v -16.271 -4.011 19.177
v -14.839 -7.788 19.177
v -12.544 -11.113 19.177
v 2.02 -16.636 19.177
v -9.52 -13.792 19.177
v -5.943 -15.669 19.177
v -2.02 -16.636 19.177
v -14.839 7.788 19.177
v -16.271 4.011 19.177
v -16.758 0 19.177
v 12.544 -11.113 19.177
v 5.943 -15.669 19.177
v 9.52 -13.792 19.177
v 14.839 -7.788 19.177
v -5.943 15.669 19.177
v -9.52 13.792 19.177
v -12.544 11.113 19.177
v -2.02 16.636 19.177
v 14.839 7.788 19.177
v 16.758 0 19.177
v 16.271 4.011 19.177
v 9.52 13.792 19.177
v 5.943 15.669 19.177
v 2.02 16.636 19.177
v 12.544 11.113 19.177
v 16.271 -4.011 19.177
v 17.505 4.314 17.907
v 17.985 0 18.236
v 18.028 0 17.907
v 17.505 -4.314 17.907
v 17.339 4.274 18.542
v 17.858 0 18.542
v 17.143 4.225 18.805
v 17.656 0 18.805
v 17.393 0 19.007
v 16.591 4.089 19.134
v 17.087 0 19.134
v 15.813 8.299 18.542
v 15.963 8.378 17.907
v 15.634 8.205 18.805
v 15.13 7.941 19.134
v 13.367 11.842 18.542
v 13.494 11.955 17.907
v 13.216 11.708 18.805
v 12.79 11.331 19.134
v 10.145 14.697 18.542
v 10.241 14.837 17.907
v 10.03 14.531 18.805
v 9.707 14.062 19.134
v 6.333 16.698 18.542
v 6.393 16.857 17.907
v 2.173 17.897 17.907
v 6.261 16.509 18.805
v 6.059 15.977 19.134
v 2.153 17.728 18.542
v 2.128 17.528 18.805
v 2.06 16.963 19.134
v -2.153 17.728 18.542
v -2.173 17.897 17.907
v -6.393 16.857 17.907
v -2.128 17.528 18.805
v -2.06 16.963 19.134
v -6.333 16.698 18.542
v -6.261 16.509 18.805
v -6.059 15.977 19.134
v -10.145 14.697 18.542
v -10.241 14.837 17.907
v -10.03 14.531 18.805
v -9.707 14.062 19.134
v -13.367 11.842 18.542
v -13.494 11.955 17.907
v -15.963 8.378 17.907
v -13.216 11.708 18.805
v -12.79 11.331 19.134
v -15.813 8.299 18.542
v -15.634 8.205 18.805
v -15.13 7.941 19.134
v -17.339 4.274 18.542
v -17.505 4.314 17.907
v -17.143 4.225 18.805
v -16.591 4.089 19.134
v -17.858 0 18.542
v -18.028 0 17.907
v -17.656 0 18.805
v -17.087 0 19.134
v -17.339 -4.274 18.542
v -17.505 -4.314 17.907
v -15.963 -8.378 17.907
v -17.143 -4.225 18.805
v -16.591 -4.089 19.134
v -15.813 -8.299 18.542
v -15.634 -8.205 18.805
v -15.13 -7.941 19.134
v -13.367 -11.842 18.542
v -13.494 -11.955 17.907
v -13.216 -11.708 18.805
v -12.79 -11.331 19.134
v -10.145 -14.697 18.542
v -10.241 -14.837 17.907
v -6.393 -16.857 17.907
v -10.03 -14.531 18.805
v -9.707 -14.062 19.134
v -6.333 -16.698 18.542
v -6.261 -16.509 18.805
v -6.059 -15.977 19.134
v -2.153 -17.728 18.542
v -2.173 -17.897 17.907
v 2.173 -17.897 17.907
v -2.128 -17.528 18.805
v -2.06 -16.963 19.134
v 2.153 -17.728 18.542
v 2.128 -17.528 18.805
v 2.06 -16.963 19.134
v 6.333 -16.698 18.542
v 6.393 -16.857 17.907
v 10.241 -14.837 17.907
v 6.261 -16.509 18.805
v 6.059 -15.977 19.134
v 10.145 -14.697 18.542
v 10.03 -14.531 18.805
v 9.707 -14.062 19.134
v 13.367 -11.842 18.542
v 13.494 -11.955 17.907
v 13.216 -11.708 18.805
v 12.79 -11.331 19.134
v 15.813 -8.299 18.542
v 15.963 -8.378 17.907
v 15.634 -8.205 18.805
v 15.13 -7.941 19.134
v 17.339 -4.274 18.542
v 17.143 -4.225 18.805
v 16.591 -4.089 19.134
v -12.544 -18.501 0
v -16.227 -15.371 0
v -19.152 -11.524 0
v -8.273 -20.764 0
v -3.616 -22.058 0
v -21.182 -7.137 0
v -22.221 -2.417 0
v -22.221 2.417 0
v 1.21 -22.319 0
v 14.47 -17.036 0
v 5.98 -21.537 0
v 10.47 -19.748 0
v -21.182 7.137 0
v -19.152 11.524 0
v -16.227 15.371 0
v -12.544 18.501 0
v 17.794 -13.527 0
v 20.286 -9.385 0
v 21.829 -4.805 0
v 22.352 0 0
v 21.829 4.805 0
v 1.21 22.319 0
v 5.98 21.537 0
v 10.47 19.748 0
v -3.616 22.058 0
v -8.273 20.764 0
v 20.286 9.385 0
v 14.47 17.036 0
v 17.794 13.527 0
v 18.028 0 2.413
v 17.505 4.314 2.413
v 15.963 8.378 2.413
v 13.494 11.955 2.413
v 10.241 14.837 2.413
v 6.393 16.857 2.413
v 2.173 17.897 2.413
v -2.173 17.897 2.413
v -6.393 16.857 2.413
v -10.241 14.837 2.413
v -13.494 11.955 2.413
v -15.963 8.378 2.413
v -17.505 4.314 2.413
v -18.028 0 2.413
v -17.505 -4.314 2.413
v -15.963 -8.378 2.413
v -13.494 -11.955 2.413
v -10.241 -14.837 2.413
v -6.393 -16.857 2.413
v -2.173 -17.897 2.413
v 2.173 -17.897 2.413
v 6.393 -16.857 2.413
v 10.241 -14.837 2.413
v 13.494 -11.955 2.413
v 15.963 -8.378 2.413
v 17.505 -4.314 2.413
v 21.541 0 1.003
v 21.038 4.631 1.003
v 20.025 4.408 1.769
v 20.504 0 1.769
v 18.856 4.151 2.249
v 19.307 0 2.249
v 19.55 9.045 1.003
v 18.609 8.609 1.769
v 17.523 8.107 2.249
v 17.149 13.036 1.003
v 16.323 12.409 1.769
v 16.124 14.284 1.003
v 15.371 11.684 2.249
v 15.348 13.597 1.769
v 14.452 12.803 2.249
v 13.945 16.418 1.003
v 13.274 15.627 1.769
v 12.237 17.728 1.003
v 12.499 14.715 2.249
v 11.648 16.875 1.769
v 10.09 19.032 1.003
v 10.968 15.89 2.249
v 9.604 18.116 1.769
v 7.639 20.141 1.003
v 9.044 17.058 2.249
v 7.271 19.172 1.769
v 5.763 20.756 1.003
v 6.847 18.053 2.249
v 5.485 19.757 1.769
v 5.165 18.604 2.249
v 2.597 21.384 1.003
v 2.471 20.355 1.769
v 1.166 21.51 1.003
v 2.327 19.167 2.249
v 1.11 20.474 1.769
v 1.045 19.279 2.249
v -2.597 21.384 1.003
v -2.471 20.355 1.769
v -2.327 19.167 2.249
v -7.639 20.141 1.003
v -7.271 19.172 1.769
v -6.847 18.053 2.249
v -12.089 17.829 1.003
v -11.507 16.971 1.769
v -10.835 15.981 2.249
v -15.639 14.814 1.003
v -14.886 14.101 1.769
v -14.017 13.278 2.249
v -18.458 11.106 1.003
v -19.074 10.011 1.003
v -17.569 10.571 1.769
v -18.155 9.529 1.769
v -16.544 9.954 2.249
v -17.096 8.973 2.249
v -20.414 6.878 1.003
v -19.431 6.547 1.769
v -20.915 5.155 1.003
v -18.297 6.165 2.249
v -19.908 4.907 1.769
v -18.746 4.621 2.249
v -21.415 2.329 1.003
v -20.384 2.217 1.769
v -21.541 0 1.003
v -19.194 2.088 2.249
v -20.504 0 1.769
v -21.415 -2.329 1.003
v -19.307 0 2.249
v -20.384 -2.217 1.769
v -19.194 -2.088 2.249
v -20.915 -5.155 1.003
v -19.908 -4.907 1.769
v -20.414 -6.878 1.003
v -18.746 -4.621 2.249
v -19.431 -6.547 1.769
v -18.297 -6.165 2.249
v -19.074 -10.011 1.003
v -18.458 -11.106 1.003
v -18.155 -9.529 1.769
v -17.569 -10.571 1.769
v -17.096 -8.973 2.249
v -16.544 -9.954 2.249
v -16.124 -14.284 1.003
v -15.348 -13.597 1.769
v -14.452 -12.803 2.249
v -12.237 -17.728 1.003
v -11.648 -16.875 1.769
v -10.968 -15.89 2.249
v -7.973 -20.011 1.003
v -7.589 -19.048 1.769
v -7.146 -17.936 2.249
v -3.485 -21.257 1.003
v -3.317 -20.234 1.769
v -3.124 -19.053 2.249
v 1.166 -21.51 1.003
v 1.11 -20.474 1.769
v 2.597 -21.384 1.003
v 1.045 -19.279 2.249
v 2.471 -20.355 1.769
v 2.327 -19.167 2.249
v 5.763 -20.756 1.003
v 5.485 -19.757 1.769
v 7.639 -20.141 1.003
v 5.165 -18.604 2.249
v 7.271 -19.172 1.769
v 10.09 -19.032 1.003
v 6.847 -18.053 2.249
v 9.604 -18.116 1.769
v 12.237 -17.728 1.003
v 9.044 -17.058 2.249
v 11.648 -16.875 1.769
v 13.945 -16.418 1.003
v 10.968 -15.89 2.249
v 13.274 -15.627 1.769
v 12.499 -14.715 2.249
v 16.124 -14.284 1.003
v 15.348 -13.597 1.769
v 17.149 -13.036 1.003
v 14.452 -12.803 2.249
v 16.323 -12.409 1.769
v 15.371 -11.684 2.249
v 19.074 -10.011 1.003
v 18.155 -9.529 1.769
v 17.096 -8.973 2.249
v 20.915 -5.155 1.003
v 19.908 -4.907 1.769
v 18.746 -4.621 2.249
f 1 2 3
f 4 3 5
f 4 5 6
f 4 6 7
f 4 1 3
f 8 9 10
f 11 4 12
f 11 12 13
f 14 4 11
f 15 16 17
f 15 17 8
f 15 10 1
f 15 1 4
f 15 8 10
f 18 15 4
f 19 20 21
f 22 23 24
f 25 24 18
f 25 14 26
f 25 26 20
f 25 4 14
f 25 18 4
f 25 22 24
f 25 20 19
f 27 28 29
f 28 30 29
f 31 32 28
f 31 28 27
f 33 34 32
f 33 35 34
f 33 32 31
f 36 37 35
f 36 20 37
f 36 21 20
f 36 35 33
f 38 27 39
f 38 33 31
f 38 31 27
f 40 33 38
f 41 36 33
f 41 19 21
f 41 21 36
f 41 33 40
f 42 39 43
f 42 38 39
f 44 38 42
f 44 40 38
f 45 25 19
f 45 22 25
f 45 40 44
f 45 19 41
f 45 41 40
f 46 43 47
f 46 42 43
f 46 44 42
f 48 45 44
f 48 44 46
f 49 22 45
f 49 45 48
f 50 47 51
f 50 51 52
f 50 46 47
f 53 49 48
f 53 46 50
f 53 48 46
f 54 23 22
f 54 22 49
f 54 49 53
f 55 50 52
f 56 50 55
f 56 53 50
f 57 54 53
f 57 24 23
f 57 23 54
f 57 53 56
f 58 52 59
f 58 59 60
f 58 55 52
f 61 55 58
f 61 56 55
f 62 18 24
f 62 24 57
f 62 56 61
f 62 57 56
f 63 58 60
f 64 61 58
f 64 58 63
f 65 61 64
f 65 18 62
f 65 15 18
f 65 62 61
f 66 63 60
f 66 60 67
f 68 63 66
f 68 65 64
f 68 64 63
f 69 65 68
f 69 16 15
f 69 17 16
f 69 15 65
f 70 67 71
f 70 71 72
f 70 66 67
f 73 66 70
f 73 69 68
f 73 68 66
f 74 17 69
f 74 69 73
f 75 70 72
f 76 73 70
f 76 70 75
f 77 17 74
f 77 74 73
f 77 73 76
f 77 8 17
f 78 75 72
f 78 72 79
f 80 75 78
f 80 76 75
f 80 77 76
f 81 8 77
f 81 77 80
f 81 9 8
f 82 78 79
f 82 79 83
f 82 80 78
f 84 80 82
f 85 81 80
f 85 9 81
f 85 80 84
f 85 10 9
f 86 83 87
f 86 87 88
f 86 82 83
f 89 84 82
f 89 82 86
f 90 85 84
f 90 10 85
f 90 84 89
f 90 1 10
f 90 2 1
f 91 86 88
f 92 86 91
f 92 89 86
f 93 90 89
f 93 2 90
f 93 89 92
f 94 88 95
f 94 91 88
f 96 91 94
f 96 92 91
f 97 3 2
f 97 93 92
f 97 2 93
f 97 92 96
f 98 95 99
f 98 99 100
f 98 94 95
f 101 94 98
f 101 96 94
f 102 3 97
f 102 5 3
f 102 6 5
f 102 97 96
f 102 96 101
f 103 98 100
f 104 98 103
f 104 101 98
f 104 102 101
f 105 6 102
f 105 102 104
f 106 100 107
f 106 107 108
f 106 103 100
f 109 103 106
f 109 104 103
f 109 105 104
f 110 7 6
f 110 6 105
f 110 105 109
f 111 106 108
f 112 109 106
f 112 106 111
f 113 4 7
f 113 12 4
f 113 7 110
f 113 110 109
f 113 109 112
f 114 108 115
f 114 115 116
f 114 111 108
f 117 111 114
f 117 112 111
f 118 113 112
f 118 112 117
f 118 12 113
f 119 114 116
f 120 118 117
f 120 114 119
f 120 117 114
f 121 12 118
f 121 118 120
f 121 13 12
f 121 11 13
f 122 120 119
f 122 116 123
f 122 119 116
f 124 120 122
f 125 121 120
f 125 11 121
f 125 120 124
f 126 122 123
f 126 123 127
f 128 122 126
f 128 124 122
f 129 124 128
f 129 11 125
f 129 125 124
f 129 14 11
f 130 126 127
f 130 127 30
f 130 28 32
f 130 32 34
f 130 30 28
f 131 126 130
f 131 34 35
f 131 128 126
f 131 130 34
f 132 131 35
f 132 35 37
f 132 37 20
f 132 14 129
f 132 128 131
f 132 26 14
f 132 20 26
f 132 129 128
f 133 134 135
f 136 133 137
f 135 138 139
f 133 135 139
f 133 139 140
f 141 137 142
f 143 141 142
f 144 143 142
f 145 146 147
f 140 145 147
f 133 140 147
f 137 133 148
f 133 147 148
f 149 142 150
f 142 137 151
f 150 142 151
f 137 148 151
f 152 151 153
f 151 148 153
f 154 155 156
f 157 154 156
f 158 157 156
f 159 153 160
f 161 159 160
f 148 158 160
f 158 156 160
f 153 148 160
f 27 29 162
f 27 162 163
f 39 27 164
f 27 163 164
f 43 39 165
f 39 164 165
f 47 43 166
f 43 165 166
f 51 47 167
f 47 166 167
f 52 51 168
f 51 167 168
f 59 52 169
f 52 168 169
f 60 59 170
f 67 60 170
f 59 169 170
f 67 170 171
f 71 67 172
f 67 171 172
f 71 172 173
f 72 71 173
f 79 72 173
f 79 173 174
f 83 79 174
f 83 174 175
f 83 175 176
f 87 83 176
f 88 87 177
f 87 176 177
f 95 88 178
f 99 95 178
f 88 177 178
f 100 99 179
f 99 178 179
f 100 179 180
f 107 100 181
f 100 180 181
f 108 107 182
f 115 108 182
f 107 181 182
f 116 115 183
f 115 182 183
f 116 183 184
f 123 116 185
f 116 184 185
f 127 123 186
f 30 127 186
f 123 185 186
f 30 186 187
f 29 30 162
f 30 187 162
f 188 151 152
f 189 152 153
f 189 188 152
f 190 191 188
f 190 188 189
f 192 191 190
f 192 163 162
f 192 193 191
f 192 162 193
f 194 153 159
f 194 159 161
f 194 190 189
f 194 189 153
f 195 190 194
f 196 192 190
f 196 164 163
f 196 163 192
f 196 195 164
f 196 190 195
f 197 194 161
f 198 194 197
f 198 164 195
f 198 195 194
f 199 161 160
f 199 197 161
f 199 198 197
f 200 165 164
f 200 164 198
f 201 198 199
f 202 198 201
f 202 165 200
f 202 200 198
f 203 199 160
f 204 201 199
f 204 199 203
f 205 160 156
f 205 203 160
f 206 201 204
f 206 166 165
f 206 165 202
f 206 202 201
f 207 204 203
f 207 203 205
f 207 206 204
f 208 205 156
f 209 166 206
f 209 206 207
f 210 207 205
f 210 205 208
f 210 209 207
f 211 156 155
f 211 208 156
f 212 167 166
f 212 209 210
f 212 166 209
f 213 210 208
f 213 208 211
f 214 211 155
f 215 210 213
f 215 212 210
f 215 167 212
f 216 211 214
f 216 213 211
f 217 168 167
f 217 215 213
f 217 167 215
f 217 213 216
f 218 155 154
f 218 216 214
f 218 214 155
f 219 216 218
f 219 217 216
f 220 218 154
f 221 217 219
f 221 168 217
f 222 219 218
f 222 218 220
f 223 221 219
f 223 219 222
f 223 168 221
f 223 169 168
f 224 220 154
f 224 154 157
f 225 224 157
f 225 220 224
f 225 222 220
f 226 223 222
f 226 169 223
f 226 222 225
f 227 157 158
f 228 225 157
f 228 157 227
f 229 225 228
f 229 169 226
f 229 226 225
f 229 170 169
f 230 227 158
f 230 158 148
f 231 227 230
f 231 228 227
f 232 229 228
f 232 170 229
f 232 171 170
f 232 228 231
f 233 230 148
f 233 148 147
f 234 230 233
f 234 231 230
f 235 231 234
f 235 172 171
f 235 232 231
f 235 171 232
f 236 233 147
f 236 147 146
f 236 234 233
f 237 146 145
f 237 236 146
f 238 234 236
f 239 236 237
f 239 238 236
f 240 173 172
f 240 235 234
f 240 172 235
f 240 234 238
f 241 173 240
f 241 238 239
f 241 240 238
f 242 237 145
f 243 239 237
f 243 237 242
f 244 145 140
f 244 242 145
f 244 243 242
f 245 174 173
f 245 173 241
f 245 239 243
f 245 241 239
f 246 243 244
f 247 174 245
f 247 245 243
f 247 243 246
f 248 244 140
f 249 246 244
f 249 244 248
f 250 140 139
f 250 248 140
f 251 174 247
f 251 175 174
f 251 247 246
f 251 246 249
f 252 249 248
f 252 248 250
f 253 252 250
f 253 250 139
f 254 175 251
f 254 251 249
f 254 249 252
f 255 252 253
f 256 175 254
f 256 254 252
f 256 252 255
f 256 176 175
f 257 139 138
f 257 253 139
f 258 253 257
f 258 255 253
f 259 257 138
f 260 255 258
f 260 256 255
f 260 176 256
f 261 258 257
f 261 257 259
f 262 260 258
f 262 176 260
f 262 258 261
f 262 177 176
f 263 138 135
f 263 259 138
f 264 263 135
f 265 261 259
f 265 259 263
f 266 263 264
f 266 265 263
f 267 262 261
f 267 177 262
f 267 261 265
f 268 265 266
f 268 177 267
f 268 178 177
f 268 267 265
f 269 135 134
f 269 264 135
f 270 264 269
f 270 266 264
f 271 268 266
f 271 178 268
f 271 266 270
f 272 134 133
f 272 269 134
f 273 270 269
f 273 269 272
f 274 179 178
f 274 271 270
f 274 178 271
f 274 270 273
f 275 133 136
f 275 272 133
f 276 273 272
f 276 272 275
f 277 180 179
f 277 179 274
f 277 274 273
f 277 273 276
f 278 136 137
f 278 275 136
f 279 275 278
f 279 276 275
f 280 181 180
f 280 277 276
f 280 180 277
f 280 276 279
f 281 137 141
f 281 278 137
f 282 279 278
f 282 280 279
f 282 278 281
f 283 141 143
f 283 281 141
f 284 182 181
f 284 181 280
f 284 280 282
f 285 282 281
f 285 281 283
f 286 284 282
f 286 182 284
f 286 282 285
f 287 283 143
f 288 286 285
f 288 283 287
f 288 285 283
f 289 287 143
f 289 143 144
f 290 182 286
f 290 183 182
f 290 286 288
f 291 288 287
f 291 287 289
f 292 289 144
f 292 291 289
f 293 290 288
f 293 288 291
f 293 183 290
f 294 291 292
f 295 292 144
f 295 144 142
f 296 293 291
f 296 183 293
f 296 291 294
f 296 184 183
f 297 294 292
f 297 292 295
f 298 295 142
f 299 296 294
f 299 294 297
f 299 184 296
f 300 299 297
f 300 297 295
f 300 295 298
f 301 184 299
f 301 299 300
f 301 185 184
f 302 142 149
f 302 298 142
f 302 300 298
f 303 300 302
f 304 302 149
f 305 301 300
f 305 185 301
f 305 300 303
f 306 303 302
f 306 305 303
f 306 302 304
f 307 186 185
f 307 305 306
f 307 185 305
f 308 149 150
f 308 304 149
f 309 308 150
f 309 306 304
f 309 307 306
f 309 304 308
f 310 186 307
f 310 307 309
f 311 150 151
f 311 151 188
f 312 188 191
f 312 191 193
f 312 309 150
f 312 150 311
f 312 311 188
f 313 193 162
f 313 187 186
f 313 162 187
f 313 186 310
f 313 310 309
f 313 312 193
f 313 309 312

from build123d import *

# Parameters (mm, degrees)
F0_R     = 22.352
F1_DEPTH = 2.413
F3_R     = 18.0284006892
F4_DEPTH = 16.764
F5_R     = 1.27


# Not quite as in the source:
# - a fillet or chamfer that OpenCascade refuses, or shapes differently, is made with other operations: its cross-section is extruded or revolved along the edge and cut away or added


with BuildPart() as f1:
    # F0 (on Top) → F1 (new body)
    with BuildSketch(Plane.XY):
        Circle(F0_R)
    extrude(amount=F1_DEPTH)

    # F2: fillet of radius 5.08 on 1 edges, made by hand

    # F2_s1 → F2_t2 (revolve, cut)
    with BuildSketch(Plane.XZ):
        with BuildLine():
            ThreePointArc((22.352, 0), (20.5040864528, 1.7689192959), (18.0284006892, 2.413))
            Line((18.0284006892, 2.413), (22.352, 2.413))
            Line((22.352, 2.413), (22.352, 0))
        make_face()
    revolve(axis=Axis((0, 0, 2.413), (0, 0, 1)), mode=Mode.SUBTRACT)

    # F3 (on face) → F4 (join)
    with BuildSketch(Plane.XY.offset(2.413)):
        Circle(F3_R)
    extrude(amount=F4_DEPTH)

    # F5
    f5_edges = [f1.edges().sort_by_distance(p)[0] for p in [
        (-18.028401, 0, 19.177),
    ]]
    fillet(f5_edges, radius=F5_R)


solid = f1.part
